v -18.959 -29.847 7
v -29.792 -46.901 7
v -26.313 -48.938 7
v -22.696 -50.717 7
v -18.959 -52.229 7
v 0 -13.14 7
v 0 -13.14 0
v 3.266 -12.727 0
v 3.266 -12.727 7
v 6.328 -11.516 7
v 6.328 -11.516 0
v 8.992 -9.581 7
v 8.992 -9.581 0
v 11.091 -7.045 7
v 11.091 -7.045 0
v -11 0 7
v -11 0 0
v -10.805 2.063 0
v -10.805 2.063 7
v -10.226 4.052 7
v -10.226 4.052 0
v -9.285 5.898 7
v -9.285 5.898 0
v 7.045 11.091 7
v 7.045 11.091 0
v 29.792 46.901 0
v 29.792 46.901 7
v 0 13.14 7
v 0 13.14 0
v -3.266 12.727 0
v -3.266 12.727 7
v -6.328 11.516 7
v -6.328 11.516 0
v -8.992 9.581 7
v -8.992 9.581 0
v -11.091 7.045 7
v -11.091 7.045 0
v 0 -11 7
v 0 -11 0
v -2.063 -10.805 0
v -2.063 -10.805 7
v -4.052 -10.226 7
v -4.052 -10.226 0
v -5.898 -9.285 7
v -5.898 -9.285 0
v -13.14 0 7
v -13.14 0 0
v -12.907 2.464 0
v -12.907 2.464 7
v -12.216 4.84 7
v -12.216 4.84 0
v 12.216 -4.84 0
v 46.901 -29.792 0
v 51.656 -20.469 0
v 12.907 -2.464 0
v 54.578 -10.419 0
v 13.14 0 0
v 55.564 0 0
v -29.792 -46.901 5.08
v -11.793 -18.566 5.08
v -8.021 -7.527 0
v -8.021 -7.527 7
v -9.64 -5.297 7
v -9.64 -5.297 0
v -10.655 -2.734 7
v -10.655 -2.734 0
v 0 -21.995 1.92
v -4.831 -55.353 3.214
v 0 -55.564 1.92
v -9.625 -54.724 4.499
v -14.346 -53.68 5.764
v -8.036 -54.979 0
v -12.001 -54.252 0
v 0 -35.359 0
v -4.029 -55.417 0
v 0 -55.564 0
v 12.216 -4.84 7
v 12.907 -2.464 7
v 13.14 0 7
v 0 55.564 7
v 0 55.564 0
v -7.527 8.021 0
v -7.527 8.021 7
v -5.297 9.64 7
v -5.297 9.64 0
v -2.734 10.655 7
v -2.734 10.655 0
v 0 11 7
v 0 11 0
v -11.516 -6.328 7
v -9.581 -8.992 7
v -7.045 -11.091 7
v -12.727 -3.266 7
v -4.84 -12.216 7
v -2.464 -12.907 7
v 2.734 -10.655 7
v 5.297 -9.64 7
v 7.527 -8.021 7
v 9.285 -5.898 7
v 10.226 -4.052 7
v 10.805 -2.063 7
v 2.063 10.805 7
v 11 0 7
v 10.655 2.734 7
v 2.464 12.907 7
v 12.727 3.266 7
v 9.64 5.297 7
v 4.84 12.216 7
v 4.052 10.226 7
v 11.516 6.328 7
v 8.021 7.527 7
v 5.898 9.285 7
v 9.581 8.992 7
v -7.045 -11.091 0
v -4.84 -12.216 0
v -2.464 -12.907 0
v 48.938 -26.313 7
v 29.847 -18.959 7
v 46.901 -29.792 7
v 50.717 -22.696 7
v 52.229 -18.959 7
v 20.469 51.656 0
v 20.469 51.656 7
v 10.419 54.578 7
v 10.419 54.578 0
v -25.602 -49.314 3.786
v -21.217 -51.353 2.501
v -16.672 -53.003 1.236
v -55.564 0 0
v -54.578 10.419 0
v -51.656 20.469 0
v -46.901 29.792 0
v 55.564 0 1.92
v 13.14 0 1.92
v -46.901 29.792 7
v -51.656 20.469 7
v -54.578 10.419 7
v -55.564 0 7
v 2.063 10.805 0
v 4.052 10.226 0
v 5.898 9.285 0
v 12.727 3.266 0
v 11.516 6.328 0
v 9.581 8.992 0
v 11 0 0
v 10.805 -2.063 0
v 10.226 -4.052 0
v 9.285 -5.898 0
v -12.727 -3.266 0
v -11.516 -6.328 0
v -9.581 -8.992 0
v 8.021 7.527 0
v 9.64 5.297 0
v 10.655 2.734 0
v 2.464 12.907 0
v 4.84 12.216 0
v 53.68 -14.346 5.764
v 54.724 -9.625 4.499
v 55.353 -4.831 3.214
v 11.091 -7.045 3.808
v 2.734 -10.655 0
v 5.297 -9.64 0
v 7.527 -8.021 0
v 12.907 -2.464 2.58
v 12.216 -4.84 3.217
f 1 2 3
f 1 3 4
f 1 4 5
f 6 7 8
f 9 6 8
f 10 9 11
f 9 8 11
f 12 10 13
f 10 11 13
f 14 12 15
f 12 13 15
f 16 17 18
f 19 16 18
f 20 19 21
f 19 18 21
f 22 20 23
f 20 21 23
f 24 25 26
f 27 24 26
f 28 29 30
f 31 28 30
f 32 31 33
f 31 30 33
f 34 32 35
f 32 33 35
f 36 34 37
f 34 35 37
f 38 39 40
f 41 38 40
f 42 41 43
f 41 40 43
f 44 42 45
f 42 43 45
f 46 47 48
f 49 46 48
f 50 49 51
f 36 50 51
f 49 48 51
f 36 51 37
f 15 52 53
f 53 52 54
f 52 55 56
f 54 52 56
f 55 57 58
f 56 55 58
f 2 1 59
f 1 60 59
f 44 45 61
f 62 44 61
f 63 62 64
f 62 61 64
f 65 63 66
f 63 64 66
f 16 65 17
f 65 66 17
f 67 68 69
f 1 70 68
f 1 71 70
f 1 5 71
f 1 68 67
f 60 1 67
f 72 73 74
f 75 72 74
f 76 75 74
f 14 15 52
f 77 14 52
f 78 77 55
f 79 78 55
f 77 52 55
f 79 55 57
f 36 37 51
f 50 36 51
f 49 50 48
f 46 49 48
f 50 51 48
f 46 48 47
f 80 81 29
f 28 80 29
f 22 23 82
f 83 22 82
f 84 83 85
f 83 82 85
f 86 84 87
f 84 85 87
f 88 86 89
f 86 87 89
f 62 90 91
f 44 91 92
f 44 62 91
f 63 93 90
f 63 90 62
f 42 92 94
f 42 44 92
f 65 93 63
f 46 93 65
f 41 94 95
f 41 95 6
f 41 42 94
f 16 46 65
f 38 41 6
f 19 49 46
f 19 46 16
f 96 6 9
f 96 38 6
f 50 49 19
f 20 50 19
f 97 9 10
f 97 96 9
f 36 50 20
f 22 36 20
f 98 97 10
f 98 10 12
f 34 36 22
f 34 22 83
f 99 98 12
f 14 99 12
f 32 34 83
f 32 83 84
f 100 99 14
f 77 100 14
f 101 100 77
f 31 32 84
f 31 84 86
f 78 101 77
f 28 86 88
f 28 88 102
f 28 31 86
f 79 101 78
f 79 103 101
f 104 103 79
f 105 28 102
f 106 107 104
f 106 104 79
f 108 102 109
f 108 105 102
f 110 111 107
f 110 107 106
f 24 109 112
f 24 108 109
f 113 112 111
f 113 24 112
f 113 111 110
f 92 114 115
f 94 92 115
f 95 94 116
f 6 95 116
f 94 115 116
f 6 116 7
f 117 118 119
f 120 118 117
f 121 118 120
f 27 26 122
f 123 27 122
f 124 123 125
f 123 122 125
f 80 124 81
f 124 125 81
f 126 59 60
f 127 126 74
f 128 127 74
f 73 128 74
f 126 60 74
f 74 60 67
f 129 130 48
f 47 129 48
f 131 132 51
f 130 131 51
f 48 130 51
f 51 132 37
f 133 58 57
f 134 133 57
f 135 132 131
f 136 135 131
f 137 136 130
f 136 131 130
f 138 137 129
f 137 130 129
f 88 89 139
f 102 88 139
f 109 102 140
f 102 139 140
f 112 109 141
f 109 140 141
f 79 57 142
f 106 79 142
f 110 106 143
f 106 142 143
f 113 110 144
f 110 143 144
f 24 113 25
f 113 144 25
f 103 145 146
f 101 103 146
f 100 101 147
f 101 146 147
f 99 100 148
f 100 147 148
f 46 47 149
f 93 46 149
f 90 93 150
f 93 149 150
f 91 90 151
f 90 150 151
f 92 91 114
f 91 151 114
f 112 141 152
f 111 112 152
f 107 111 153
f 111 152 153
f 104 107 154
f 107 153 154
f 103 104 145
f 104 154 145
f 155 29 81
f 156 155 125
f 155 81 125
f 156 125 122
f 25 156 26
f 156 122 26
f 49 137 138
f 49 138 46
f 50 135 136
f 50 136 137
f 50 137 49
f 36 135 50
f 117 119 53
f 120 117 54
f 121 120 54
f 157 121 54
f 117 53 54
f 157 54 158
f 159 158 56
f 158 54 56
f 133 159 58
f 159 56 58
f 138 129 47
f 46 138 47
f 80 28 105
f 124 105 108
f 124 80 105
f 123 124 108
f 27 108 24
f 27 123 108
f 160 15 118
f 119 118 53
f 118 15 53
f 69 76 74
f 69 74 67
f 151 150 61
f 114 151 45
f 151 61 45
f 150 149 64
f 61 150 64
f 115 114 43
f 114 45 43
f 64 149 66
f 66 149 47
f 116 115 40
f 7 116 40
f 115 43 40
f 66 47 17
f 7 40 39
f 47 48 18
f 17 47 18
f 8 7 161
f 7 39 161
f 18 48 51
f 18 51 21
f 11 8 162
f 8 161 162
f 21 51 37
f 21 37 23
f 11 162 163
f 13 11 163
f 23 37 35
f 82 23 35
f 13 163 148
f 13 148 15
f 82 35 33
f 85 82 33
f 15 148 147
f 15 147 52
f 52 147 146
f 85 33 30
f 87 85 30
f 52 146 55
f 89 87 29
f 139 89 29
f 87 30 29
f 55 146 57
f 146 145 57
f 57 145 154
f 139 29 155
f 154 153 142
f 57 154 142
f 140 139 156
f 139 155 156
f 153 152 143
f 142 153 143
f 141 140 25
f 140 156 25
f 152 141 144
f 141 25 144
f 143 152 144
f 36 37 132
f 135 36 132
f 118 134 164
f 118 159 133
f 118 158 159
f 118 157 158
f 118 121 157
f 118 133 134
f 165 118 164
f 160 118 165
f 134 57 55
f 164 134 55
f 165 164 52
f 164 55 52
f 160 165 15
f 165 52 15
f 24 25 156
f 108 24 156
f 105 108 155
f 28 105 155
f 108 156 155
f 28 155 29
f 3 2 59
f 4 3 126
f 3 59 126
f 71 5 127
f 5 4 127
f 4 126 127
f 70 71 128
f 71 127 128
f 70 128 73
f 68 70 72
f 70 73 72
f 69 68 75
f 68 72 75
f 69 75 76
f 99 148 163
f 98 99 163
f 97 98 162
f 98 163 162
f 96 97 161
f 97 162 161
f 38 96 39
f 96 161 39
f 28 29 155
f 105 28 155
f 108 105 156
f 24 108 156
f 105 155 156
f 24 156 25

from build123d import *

# Parameters (mm, degrees)
F1_DEPTH    = 7
F2_DEPTH    = 7
F3_SIZE2    = 18.9588181024
F3_SIZE     = 5.08
F3_2_SIZE2  = 18.9588181024
F3_2_SIZE   = 5.08
F4_T1_DEPTH = 140.8854077886


# Not quite as in the source:
# - a fillet or chamfer that OpenCascade refuses, or shapes differently, is made with other operations: its cross-section is extruded or revolved along the edge and cut away or added


with BuildPart() as f1:
    # F0 (on Top) → F1 (new body)
    with BuildSketch(Plane.XY):
        with BuildLine():
            Line((-13.1396949858, 0), (-11, 0))
            ThreePointArc((-11, 0), (-10.5625846979, 3.0711243054), (-9.2851264546, 5.8980019262))
            Line((-9.2851264546, 5.8980019262), (-11.0912481381, 7.0452678487))
            ThreePointArc((-11.0912481381, 7.0452678487), (-12.6171946539, 3.6685124216), (-13.1396949858, 0))
        make_face()
        with BuildLine():
            ThreePointArc((-9.2851264546, 5.8980019262), (-5.2972624445, 9.640488089), (0, 11))
            Line((0, 11), (0, 13.1396949858))
            ThreePointArc((0, 13.1396949858), (-6.3276738891, 11.5157339094), (-11.0912481381, 7.0452678487))
            Line((-11.0912481381, 7.0452678487), (-9.2851264546, 5.8980019262))
        make_face()
        with BuildLine():
            ThreePointArc((0, 11), (3.0711243054, 10.5625846979), (5.8980019262, 9.2851264546))
            Line((5.8980019262, 9.2851264546), (7.0452678487, 11.0912481381))
            ThreePointArc((7.0452678487, 11.0912481381), (3.6685124216, 12.6171946539), (0, 13.1396949858))
            Line((0, 13.1396949858), (0, 11))
        make_face()
        with BuildLine():
            ThreePointArc((5.8980019262, 9.2851264546), (9.640488089, 5.2972624445), (11, 0))
            Line((11, 0), (13.1396949858, 0))
            ThreePointArc((13.1396949858, 0), (11.5157339094, 6.3276738891), (7.0452678487, 11.0912481381))
            Line((7.0452678487, 11.0912481381), (5.8980019262, 9.2851264546))
        make_face()
        with BuildLine():
            Line((13.1396949858, 0), (11, 0))
            ThreePointArc((11, 0), (10.5625846979, -3.0711243054), (9.2851264546, -5.8980019262))
            Line((9.2851264546, -5.8980019262), (11.0912481381, -7.0452678487))
            ThreePointArc((11.0912481381, -7.0452678487), (12.6171946539, -3.6685124216), (13.1396949858, 0))
        make_face()
        with BuildLine():
            Line((11.0912481381, -7.0452678487), (9.2851264546, -5.8980019262))
            ThreePointArc((9.2851264546, -5.8980019262), (5.2972624445, -9.640488089), (0, -11))
            Line((0, -11), (0, -13.1396949858))
            ThreePointArc((0, -13.1396949858), (6.3276738891, -11.5157339094), (11.0912481381, -7.0452678487))
        make_face()
        with BuildLine():
            Line((0, -13.1396949858), (0, -11))
            ThreePointArc((0, -11), (-3.0711243054, -10.5625846979), (-5.8980019262, -9.2851264546))
            Line((-5.8980019262, -9.2851264546), (-7.0452678487, -11.0912481381))
            ThreePointArc((-7.0452678487, -11.0912481381), (-3.6685124216, -12.6171946539), (0, -13.1396949858))
        make_face()
        with BuildLine():
            ThreePointArc((-5.8980019262, -9.2851264546), (-9.640488089, -5.2972624445), (-11, 0))
            Line((-11, 0), (-13.1396949858, 0))
            ThreePointArc((-13.1396949858, 0), (-11.5157339094, -6.3276738891), (-7.0452678487, -11.0912481381))
            Line((-7.0452678487, -11.0912481381), (-5.8980019262, -9.2851264546))
        make_face()
    extrude(amount=F1_DEPTH)


with BuildPart() as f2:
    # F0 (on Top) → F2 (new body)
    with BuildSketch(Plane.XY):
        with BuildLine():
            ThreePointArc((0, 13.1396949858), (3.6685124216, 12.6171946539), (7.0452678487, 11.0912481381))
            Line((7.0452678487, 11.0912481381), (29.7921797922, 46.9013337383))
            Line((29.7921797922, 46.9013337383), (0, 53.34))
            Line((0, 53.34), (0, 13.1396949858))
        make_face()
        with BuildLine():
            Line((0, 53.34), (29.7921797922, 46.9013337383))
            ThreePointArc((29.7921797922, 46.9013337383), (15.5129633081, 53.3540725025), (0, 55.5635589501))
            Line((0, 55.5635589501), (0, 53.34))
        make_face()
    extrude(amount=F2_DEPTH)


with BuildPart() as f2b:
    # F0 (on Top) → F2, piece 2 (new body)
    with BuildSketch(Plane.XY):
        with BuildLine():
            Line((-53.34, 0), (-13.1396949858, 0))
            ThreePointArc((-13.1396949858, 0), (-12.6171946539, 3.6685124216), (-11.0912481381, 7.0452678487))
            Line((-11.0912481381, 7.0452678487), (-46.9013337383, 29.7921797922))
            Line((-46.9013337383, 29.7921797922), (-53.34, 0))
        make_face()
        with BuildLine():
            Line((-55.5635589501, 0), (-53.34, 0))
            Line((-53.34, 0), (-46.9013337383, 29.7921797922))
            ThreePointArc((-46.9013337383, 29.7921797922), (-53.3540725025, 15.5129633081), (-55.5635589501, 0))
        make_face()
    extrude(amount=F2_DEPTH)


with BuildPart() as f2c:
    # F0 (on Top) → F2, piece 3 (new body)
    with BuildSketch(Plane.XY):
        with BuildLine():
            Line((0, -53.34), (0, -13.1396949858))
            ThreePointArc((0, -13.1396949858), (-3.6685124216, -12.6171946539), (-7.0452678487, -11.0912481381))
            Line((-7.0452678487, -11.0912481381), (-29.7921797922, -46.9013337383))
            Line((-29.7921797922, -46.9013337383), (0, -53.34))
        make_face()
        with BuildLine():
            Line((0, -55.5635589501), (0, -53.34))
            Line((0, -53.34), (-29.7921797922, -46.9013337383))
            ThreePointArc((-29.7921797922, -46.9013337383), (-15.5129633081, -53.3540725025), (0, -55.5635589501))
        make_face()
    extrude(amount=F2_DEPTH)

    # F3
    f3_edges = [f2c.edges().sort_by_distance(p)[0] for p in [
        (0, -34.351627, 7),
    ]]
    f3_side = f2c.faces().sort_by_distance((0, -34.351627, 3.5))[0]
    chamfer(f3_edges, length=F3_SIZE, length2=F3_SIZE2, reference=f3_side)

    # F4: chamfer of 5.08 x 18.9588181024 on 1 edges, made by hand

    # F4_s2 → F4_t1 (cut)
    with BuildSketch(Plane(origin=(19.3513855664, 30.4645648313, 0), x_dir=(0, 0, 1), z_dir=(-0.5361819933, -0.844102405, 0))):
        Polygon((5.08, 0), (0, -18.9588181024), (0, 0), align=None)
    extrude(amount=F4_T1_DEPTH, mode=Mode.SUBTRACT)


with BuildPart() as f2d:
    # F0 (on Top) → F2, piece 4 (new body)
    with BuildSketch(Plane.XY):
        with BuildLine():
            Line((53.34, 0), (13.1396949858, 0))
            ThreePointArc((13.1396949858, 0), (12.6171946539, -3.6685124216), (11.0912481381, -7.0452678487))
            Line((11.0912481381, -7.0452678487), (46.9013337383, -29.7921797922))
            Line((46.9013337383, -29.7921797922), (53.34, 0))
        make_face()
        with BuildLine():
            Line((55.5635589501, 0), (53.34, 0))
            Line((53.34, 0), (46.9013337383, -29.7921797922))
            ThreePointArc((46.9013337383, -29.7921797922), (53.3540725025, -15.5129633081), (55.5635589501, 0))
        make_face()
    extrude(amount=F2_DEPTH)

    # F3#2
    f3_2_edges = [f2d.edges().sort_by_distance(p)[0] for p in [
        (34.351627, 0, 7),
    ]]
    f3_2_side = f2d.faces().sort_by_distance((34.351627, 0, 3.5))[0]
    chamfer(f3_2_edges, length=F3_2_SIZE, length2=F3_2_SIZE2, reference=f3_2_side)


solid = Compound([f1.part, f2.part, f2b.part, f2c.part, f2d.part])
